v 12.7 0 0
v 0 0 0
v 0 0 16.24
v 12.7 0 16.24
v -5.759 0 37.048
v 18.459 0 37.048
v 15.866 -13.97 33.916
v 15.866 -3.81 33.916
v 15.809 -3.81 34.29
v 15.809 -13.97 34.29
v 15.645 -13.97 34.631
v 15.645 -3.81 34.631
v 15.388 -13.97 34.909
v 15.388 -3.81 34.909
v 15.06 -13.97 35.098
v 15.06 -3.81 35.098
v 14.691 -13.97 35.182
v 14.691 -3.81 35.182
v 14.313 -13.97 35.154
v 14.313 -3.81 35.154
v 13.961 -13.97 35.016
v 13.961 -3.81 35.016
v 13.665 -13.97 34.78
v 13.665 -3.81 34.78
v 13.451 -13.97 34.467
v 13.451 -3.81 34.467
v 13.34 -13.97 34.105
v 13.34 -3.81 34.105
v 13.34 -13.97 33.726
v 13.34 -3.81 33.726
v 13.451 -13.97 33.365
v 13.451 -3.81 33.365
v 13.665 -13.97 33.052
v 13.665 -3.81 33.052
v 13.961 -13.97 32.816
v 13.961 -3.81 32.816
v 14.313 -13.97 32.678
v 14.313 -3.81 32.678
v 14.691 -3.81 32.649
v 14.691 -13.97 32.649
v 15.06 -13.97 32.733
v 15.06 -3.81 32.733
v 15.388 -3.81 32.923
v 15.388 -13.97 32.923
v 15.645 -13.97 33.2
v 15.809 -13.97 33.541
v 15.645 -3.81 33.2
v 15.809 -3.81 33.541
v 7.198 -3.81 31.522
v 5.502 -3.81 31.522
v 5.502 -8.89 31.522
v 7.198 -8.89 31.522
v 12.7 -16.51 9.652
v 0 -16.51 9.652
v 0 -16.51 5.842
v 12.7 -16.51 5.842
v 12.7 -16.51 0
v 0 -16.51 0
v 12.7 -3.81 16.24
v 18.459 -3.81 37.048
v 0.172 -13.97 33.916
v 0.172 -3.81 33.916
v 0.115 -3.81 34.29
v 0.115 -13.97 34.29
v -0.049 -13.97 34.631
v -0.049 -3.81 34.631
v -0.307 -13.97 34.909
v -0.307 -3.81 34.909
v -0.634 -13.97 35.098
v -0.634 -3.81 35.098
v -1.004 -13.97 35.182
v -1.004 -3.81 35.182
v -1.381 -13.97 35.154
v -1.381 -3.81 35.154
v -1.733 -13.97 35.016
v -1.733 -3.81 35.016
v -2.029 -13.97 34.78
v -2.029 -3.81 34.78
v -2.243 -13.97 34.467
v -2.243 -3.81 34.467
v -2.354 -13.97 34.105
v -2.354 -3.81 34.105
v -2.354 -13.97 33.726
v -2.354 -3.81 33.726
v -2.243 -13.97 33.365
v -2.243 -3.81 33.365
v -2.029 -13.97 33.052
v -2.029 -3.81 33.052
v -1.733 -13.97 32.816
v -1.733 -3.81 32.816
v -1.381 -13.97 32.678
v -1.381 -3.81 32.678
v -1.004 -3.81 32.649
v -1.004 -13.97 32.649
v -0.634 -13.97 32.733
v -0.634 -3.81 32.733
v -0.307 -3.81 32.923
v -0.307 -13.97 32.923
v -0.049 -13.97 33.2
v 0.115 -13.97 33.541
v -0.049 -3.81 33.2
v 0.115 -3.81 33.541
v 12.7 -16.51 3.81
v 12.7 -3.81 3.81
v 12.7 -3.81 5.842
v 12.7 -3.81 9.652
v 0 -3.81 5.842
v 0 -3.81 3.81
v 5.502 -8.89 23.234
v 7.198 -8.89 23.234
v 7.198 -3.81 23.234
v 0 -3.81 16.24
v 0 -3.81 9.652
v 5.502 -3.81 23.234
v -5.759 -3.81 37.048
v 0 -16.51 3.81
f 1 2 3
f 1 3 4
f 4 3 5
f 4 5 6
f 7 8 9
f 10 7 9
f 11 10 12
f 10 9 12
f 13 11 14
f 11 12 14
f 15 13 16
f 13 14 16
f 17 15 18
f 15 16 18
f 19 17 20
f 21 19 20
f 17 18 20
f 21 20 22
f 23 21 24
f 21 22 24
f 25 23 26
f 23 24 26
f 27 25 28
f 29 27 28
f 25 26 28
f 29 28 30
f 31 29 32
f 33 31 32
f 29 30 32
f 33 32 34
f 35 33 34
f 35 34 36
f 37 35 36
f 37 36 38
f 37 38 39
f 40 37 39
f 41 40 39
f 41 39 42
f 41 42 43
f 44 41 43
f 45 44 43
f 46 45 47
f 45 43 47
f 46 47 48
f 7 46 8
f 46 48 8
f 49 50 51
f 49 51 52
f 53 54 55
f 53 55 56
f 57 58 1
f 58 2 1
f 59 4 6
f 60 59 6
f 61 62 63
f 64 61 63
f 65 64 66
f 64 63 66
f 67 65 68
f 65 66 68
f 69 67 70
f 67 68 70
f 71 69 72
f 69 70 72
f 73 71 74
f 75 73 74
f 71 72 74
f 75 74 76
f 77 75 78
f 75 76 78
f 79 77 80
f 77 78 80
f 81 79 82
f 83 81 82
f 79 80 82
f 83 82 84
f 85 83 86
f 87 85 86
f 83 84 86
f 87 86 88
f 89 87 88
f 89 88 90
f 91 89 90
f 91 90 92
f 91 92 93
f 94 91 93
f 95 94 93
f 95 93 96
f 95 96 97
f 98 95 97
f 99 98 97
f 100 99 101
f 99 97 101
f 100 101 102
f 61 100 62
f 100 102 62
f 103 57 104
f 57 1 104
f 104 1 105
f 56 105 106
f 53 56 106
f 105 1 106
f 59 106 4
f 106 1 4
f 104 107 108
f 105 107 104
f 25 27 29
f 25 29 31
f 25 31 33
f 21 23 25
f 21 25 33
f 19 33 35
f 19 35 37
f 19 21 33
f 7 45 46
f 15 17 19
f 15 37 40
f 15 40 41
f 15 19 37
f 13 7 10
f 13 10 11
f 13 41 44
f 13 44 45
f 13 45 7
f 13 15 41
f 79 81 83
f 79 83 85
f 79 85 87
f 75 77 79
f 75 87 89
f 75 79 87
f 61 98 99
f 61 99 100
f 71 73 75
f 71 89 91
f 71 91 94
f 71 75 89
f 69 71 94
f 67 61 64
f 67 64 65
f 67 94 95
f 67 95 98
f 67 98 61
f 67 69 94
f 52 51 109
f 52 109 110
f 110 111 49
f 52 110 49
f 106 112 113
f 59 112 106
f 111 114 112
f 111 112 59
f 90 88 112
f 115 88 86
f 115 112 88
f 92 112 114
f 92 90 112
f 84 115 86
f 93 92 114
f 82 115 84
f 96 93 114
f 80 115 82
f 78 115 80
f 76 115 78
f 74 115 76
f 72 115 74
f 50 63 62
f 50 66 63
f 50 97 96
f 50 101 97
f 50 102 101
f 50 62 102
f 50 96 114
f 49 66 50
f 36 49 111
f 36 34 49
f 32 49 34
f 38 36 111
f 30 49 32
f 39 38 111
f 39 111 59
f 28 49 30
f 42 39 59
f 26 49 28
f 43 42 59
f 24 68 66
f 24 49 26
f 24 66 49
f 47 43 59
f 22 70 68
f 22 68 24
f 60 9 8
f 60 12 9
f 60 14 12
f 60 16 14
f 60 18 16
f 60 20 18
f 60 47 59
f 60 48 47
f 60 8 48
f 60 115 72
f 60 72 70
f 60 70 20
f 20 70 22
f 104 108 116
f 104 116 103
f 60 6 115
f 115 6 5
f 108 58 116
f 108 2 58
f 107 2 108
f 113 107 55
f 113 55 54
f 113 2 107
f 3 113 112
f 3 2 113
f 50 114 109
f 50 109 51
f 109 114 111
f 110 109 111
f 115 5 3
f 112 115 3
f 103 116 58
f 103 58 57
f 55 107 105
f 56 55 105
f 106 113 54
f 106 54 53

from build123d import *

# Parameters (mm, degrees)
F0_W     = 12.7
F0_H     = 16.2401907146
F1_DEPTH = 3.81
F2_W     = 12.7
F2_H     = 3.81
F3_DEPTH = 12.7
F4_R     = 1.27
F5_DEPTH = 10.16
F6_W     = 1.6954607129
F6_H     = 8.2879924147
F7_DEPTH = 5.08


with BuildPart() as f1:
    # F0 (on Front) → F1 (new body)
    with BuildSketch(Plane.XZ):
        with Locations((6.35, 8.1200953573)):
            Rectangle(F0_W, F0_H)
        Polygon((-5.7594607129, 37.0478025981), (0, 16.2401907146), (12.7, 16.2401907146), (18.4594607129, 37.0478025981), align=None)
    extrude(amount=F1_DEPTH)

    # F2 (on face) → F3 (join)
    with BuildSketch(Plane.XZ.offset(3.81)):
        with Locations((6.35, 1.905)):
            Rectangle(F2_W, F2_H)
        with Locations((6.35, 7.747)):
            Rectangle(F2_W, F2_H)
    extrude(amount=F3_DEPTH)

    # F4 (on face) → F5 (join)
    with BuildSketch(Plane.XZ.offset(3.81)):
        with Locations((14.5957274362, 33.9156836271)):
            Circle(F4_R)
        with Locations((-1.0984551627, 33.9156836271)):
            Circle(F4_R)
    extrude(amount=F5_DEPTH)

    # F6 (on face) → F7 (join)
    with BuildSketch(Plane.XZ.offset(3.81)):
        with Locations((6.35, 27.3775784299)):
            Rectangle(F6_W, F6_H)
    extrude(amount=F7_DEPTH)


solid = f1.part
